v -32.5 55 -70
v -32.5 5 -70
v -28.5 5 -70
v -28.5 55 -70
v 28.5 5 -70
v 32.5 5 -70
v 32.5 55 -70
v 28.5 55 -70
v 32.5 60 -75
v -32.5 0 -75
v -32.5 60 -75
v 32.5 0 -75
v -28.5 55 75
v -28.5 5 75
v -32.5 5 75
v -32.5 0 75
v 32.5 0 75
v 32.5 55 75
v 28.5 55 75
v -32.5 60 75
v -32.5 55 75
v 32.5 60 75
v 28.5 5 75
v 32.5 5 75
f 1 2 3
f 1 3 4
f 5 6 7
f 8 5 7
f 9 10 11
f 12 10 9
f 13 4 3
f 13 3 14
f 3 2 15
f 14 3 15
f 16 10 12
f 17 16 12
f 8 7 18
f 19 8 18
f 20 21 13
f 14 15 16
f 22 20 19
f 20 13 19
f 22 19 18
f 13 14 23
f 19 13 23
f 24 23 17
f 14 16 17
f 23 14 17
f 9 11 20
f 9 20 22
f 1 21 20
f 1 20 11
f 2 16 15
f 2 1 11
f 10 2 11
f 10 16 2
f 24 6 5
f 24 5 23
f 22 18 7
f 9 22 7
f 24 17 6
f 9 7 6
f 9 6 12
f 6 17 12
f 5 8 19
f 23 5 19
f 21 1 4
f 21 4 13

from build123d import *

# Parameters (mm, degrees)
ESQUISSE1_W             = 65
ESQUISSE1_H             = 150
BOSS_EXTRU_1_DEPTH      = 60
ESQUISSE2_W             = 145
ESQUISSE2_H             = 50
ENL_V_MAT_EXTRU_1_DEPTH = 4


with BuildPart() as part:
    # Esquisse1 → Boss.-Extru.1 (new body)
    with BuildSketch(Plane(origin=(0, 0, 0), x_dir=(1, 0, 0), z_dir=(0, 1, 0))):
        Rectangle(ESQUISSE1_W, ESQUISSE1_H)
    extrude(amount=BOSS_EXTRU_1_DEPTH)

    # Esquisse2 → Enlèv. mat.-Extru.1 (cut)
    with BuildSketch(Plane.ZY.offset(32.5)):
        with Locations((2.5, 30)):
            Rectangle(ESQUISSE2_W, ESQUISSE2_H)
    enl_v_mat_extru_1 = extrude(amount=-ENL_V_MAT_EXTRU_1_DEPTH, mode=Mode.SUBTRACT)

    # Symétrie1: Enlèv. mat.-Extru.1 across plane
    add(enl_v_mat_extru_1.mirror(Plane(origin=(0, 0, 0), x_dir=(0, 0, 1), z_dir=(1, 0, 0))), mode=Mode.SUBTRACT)


solid = part.part
